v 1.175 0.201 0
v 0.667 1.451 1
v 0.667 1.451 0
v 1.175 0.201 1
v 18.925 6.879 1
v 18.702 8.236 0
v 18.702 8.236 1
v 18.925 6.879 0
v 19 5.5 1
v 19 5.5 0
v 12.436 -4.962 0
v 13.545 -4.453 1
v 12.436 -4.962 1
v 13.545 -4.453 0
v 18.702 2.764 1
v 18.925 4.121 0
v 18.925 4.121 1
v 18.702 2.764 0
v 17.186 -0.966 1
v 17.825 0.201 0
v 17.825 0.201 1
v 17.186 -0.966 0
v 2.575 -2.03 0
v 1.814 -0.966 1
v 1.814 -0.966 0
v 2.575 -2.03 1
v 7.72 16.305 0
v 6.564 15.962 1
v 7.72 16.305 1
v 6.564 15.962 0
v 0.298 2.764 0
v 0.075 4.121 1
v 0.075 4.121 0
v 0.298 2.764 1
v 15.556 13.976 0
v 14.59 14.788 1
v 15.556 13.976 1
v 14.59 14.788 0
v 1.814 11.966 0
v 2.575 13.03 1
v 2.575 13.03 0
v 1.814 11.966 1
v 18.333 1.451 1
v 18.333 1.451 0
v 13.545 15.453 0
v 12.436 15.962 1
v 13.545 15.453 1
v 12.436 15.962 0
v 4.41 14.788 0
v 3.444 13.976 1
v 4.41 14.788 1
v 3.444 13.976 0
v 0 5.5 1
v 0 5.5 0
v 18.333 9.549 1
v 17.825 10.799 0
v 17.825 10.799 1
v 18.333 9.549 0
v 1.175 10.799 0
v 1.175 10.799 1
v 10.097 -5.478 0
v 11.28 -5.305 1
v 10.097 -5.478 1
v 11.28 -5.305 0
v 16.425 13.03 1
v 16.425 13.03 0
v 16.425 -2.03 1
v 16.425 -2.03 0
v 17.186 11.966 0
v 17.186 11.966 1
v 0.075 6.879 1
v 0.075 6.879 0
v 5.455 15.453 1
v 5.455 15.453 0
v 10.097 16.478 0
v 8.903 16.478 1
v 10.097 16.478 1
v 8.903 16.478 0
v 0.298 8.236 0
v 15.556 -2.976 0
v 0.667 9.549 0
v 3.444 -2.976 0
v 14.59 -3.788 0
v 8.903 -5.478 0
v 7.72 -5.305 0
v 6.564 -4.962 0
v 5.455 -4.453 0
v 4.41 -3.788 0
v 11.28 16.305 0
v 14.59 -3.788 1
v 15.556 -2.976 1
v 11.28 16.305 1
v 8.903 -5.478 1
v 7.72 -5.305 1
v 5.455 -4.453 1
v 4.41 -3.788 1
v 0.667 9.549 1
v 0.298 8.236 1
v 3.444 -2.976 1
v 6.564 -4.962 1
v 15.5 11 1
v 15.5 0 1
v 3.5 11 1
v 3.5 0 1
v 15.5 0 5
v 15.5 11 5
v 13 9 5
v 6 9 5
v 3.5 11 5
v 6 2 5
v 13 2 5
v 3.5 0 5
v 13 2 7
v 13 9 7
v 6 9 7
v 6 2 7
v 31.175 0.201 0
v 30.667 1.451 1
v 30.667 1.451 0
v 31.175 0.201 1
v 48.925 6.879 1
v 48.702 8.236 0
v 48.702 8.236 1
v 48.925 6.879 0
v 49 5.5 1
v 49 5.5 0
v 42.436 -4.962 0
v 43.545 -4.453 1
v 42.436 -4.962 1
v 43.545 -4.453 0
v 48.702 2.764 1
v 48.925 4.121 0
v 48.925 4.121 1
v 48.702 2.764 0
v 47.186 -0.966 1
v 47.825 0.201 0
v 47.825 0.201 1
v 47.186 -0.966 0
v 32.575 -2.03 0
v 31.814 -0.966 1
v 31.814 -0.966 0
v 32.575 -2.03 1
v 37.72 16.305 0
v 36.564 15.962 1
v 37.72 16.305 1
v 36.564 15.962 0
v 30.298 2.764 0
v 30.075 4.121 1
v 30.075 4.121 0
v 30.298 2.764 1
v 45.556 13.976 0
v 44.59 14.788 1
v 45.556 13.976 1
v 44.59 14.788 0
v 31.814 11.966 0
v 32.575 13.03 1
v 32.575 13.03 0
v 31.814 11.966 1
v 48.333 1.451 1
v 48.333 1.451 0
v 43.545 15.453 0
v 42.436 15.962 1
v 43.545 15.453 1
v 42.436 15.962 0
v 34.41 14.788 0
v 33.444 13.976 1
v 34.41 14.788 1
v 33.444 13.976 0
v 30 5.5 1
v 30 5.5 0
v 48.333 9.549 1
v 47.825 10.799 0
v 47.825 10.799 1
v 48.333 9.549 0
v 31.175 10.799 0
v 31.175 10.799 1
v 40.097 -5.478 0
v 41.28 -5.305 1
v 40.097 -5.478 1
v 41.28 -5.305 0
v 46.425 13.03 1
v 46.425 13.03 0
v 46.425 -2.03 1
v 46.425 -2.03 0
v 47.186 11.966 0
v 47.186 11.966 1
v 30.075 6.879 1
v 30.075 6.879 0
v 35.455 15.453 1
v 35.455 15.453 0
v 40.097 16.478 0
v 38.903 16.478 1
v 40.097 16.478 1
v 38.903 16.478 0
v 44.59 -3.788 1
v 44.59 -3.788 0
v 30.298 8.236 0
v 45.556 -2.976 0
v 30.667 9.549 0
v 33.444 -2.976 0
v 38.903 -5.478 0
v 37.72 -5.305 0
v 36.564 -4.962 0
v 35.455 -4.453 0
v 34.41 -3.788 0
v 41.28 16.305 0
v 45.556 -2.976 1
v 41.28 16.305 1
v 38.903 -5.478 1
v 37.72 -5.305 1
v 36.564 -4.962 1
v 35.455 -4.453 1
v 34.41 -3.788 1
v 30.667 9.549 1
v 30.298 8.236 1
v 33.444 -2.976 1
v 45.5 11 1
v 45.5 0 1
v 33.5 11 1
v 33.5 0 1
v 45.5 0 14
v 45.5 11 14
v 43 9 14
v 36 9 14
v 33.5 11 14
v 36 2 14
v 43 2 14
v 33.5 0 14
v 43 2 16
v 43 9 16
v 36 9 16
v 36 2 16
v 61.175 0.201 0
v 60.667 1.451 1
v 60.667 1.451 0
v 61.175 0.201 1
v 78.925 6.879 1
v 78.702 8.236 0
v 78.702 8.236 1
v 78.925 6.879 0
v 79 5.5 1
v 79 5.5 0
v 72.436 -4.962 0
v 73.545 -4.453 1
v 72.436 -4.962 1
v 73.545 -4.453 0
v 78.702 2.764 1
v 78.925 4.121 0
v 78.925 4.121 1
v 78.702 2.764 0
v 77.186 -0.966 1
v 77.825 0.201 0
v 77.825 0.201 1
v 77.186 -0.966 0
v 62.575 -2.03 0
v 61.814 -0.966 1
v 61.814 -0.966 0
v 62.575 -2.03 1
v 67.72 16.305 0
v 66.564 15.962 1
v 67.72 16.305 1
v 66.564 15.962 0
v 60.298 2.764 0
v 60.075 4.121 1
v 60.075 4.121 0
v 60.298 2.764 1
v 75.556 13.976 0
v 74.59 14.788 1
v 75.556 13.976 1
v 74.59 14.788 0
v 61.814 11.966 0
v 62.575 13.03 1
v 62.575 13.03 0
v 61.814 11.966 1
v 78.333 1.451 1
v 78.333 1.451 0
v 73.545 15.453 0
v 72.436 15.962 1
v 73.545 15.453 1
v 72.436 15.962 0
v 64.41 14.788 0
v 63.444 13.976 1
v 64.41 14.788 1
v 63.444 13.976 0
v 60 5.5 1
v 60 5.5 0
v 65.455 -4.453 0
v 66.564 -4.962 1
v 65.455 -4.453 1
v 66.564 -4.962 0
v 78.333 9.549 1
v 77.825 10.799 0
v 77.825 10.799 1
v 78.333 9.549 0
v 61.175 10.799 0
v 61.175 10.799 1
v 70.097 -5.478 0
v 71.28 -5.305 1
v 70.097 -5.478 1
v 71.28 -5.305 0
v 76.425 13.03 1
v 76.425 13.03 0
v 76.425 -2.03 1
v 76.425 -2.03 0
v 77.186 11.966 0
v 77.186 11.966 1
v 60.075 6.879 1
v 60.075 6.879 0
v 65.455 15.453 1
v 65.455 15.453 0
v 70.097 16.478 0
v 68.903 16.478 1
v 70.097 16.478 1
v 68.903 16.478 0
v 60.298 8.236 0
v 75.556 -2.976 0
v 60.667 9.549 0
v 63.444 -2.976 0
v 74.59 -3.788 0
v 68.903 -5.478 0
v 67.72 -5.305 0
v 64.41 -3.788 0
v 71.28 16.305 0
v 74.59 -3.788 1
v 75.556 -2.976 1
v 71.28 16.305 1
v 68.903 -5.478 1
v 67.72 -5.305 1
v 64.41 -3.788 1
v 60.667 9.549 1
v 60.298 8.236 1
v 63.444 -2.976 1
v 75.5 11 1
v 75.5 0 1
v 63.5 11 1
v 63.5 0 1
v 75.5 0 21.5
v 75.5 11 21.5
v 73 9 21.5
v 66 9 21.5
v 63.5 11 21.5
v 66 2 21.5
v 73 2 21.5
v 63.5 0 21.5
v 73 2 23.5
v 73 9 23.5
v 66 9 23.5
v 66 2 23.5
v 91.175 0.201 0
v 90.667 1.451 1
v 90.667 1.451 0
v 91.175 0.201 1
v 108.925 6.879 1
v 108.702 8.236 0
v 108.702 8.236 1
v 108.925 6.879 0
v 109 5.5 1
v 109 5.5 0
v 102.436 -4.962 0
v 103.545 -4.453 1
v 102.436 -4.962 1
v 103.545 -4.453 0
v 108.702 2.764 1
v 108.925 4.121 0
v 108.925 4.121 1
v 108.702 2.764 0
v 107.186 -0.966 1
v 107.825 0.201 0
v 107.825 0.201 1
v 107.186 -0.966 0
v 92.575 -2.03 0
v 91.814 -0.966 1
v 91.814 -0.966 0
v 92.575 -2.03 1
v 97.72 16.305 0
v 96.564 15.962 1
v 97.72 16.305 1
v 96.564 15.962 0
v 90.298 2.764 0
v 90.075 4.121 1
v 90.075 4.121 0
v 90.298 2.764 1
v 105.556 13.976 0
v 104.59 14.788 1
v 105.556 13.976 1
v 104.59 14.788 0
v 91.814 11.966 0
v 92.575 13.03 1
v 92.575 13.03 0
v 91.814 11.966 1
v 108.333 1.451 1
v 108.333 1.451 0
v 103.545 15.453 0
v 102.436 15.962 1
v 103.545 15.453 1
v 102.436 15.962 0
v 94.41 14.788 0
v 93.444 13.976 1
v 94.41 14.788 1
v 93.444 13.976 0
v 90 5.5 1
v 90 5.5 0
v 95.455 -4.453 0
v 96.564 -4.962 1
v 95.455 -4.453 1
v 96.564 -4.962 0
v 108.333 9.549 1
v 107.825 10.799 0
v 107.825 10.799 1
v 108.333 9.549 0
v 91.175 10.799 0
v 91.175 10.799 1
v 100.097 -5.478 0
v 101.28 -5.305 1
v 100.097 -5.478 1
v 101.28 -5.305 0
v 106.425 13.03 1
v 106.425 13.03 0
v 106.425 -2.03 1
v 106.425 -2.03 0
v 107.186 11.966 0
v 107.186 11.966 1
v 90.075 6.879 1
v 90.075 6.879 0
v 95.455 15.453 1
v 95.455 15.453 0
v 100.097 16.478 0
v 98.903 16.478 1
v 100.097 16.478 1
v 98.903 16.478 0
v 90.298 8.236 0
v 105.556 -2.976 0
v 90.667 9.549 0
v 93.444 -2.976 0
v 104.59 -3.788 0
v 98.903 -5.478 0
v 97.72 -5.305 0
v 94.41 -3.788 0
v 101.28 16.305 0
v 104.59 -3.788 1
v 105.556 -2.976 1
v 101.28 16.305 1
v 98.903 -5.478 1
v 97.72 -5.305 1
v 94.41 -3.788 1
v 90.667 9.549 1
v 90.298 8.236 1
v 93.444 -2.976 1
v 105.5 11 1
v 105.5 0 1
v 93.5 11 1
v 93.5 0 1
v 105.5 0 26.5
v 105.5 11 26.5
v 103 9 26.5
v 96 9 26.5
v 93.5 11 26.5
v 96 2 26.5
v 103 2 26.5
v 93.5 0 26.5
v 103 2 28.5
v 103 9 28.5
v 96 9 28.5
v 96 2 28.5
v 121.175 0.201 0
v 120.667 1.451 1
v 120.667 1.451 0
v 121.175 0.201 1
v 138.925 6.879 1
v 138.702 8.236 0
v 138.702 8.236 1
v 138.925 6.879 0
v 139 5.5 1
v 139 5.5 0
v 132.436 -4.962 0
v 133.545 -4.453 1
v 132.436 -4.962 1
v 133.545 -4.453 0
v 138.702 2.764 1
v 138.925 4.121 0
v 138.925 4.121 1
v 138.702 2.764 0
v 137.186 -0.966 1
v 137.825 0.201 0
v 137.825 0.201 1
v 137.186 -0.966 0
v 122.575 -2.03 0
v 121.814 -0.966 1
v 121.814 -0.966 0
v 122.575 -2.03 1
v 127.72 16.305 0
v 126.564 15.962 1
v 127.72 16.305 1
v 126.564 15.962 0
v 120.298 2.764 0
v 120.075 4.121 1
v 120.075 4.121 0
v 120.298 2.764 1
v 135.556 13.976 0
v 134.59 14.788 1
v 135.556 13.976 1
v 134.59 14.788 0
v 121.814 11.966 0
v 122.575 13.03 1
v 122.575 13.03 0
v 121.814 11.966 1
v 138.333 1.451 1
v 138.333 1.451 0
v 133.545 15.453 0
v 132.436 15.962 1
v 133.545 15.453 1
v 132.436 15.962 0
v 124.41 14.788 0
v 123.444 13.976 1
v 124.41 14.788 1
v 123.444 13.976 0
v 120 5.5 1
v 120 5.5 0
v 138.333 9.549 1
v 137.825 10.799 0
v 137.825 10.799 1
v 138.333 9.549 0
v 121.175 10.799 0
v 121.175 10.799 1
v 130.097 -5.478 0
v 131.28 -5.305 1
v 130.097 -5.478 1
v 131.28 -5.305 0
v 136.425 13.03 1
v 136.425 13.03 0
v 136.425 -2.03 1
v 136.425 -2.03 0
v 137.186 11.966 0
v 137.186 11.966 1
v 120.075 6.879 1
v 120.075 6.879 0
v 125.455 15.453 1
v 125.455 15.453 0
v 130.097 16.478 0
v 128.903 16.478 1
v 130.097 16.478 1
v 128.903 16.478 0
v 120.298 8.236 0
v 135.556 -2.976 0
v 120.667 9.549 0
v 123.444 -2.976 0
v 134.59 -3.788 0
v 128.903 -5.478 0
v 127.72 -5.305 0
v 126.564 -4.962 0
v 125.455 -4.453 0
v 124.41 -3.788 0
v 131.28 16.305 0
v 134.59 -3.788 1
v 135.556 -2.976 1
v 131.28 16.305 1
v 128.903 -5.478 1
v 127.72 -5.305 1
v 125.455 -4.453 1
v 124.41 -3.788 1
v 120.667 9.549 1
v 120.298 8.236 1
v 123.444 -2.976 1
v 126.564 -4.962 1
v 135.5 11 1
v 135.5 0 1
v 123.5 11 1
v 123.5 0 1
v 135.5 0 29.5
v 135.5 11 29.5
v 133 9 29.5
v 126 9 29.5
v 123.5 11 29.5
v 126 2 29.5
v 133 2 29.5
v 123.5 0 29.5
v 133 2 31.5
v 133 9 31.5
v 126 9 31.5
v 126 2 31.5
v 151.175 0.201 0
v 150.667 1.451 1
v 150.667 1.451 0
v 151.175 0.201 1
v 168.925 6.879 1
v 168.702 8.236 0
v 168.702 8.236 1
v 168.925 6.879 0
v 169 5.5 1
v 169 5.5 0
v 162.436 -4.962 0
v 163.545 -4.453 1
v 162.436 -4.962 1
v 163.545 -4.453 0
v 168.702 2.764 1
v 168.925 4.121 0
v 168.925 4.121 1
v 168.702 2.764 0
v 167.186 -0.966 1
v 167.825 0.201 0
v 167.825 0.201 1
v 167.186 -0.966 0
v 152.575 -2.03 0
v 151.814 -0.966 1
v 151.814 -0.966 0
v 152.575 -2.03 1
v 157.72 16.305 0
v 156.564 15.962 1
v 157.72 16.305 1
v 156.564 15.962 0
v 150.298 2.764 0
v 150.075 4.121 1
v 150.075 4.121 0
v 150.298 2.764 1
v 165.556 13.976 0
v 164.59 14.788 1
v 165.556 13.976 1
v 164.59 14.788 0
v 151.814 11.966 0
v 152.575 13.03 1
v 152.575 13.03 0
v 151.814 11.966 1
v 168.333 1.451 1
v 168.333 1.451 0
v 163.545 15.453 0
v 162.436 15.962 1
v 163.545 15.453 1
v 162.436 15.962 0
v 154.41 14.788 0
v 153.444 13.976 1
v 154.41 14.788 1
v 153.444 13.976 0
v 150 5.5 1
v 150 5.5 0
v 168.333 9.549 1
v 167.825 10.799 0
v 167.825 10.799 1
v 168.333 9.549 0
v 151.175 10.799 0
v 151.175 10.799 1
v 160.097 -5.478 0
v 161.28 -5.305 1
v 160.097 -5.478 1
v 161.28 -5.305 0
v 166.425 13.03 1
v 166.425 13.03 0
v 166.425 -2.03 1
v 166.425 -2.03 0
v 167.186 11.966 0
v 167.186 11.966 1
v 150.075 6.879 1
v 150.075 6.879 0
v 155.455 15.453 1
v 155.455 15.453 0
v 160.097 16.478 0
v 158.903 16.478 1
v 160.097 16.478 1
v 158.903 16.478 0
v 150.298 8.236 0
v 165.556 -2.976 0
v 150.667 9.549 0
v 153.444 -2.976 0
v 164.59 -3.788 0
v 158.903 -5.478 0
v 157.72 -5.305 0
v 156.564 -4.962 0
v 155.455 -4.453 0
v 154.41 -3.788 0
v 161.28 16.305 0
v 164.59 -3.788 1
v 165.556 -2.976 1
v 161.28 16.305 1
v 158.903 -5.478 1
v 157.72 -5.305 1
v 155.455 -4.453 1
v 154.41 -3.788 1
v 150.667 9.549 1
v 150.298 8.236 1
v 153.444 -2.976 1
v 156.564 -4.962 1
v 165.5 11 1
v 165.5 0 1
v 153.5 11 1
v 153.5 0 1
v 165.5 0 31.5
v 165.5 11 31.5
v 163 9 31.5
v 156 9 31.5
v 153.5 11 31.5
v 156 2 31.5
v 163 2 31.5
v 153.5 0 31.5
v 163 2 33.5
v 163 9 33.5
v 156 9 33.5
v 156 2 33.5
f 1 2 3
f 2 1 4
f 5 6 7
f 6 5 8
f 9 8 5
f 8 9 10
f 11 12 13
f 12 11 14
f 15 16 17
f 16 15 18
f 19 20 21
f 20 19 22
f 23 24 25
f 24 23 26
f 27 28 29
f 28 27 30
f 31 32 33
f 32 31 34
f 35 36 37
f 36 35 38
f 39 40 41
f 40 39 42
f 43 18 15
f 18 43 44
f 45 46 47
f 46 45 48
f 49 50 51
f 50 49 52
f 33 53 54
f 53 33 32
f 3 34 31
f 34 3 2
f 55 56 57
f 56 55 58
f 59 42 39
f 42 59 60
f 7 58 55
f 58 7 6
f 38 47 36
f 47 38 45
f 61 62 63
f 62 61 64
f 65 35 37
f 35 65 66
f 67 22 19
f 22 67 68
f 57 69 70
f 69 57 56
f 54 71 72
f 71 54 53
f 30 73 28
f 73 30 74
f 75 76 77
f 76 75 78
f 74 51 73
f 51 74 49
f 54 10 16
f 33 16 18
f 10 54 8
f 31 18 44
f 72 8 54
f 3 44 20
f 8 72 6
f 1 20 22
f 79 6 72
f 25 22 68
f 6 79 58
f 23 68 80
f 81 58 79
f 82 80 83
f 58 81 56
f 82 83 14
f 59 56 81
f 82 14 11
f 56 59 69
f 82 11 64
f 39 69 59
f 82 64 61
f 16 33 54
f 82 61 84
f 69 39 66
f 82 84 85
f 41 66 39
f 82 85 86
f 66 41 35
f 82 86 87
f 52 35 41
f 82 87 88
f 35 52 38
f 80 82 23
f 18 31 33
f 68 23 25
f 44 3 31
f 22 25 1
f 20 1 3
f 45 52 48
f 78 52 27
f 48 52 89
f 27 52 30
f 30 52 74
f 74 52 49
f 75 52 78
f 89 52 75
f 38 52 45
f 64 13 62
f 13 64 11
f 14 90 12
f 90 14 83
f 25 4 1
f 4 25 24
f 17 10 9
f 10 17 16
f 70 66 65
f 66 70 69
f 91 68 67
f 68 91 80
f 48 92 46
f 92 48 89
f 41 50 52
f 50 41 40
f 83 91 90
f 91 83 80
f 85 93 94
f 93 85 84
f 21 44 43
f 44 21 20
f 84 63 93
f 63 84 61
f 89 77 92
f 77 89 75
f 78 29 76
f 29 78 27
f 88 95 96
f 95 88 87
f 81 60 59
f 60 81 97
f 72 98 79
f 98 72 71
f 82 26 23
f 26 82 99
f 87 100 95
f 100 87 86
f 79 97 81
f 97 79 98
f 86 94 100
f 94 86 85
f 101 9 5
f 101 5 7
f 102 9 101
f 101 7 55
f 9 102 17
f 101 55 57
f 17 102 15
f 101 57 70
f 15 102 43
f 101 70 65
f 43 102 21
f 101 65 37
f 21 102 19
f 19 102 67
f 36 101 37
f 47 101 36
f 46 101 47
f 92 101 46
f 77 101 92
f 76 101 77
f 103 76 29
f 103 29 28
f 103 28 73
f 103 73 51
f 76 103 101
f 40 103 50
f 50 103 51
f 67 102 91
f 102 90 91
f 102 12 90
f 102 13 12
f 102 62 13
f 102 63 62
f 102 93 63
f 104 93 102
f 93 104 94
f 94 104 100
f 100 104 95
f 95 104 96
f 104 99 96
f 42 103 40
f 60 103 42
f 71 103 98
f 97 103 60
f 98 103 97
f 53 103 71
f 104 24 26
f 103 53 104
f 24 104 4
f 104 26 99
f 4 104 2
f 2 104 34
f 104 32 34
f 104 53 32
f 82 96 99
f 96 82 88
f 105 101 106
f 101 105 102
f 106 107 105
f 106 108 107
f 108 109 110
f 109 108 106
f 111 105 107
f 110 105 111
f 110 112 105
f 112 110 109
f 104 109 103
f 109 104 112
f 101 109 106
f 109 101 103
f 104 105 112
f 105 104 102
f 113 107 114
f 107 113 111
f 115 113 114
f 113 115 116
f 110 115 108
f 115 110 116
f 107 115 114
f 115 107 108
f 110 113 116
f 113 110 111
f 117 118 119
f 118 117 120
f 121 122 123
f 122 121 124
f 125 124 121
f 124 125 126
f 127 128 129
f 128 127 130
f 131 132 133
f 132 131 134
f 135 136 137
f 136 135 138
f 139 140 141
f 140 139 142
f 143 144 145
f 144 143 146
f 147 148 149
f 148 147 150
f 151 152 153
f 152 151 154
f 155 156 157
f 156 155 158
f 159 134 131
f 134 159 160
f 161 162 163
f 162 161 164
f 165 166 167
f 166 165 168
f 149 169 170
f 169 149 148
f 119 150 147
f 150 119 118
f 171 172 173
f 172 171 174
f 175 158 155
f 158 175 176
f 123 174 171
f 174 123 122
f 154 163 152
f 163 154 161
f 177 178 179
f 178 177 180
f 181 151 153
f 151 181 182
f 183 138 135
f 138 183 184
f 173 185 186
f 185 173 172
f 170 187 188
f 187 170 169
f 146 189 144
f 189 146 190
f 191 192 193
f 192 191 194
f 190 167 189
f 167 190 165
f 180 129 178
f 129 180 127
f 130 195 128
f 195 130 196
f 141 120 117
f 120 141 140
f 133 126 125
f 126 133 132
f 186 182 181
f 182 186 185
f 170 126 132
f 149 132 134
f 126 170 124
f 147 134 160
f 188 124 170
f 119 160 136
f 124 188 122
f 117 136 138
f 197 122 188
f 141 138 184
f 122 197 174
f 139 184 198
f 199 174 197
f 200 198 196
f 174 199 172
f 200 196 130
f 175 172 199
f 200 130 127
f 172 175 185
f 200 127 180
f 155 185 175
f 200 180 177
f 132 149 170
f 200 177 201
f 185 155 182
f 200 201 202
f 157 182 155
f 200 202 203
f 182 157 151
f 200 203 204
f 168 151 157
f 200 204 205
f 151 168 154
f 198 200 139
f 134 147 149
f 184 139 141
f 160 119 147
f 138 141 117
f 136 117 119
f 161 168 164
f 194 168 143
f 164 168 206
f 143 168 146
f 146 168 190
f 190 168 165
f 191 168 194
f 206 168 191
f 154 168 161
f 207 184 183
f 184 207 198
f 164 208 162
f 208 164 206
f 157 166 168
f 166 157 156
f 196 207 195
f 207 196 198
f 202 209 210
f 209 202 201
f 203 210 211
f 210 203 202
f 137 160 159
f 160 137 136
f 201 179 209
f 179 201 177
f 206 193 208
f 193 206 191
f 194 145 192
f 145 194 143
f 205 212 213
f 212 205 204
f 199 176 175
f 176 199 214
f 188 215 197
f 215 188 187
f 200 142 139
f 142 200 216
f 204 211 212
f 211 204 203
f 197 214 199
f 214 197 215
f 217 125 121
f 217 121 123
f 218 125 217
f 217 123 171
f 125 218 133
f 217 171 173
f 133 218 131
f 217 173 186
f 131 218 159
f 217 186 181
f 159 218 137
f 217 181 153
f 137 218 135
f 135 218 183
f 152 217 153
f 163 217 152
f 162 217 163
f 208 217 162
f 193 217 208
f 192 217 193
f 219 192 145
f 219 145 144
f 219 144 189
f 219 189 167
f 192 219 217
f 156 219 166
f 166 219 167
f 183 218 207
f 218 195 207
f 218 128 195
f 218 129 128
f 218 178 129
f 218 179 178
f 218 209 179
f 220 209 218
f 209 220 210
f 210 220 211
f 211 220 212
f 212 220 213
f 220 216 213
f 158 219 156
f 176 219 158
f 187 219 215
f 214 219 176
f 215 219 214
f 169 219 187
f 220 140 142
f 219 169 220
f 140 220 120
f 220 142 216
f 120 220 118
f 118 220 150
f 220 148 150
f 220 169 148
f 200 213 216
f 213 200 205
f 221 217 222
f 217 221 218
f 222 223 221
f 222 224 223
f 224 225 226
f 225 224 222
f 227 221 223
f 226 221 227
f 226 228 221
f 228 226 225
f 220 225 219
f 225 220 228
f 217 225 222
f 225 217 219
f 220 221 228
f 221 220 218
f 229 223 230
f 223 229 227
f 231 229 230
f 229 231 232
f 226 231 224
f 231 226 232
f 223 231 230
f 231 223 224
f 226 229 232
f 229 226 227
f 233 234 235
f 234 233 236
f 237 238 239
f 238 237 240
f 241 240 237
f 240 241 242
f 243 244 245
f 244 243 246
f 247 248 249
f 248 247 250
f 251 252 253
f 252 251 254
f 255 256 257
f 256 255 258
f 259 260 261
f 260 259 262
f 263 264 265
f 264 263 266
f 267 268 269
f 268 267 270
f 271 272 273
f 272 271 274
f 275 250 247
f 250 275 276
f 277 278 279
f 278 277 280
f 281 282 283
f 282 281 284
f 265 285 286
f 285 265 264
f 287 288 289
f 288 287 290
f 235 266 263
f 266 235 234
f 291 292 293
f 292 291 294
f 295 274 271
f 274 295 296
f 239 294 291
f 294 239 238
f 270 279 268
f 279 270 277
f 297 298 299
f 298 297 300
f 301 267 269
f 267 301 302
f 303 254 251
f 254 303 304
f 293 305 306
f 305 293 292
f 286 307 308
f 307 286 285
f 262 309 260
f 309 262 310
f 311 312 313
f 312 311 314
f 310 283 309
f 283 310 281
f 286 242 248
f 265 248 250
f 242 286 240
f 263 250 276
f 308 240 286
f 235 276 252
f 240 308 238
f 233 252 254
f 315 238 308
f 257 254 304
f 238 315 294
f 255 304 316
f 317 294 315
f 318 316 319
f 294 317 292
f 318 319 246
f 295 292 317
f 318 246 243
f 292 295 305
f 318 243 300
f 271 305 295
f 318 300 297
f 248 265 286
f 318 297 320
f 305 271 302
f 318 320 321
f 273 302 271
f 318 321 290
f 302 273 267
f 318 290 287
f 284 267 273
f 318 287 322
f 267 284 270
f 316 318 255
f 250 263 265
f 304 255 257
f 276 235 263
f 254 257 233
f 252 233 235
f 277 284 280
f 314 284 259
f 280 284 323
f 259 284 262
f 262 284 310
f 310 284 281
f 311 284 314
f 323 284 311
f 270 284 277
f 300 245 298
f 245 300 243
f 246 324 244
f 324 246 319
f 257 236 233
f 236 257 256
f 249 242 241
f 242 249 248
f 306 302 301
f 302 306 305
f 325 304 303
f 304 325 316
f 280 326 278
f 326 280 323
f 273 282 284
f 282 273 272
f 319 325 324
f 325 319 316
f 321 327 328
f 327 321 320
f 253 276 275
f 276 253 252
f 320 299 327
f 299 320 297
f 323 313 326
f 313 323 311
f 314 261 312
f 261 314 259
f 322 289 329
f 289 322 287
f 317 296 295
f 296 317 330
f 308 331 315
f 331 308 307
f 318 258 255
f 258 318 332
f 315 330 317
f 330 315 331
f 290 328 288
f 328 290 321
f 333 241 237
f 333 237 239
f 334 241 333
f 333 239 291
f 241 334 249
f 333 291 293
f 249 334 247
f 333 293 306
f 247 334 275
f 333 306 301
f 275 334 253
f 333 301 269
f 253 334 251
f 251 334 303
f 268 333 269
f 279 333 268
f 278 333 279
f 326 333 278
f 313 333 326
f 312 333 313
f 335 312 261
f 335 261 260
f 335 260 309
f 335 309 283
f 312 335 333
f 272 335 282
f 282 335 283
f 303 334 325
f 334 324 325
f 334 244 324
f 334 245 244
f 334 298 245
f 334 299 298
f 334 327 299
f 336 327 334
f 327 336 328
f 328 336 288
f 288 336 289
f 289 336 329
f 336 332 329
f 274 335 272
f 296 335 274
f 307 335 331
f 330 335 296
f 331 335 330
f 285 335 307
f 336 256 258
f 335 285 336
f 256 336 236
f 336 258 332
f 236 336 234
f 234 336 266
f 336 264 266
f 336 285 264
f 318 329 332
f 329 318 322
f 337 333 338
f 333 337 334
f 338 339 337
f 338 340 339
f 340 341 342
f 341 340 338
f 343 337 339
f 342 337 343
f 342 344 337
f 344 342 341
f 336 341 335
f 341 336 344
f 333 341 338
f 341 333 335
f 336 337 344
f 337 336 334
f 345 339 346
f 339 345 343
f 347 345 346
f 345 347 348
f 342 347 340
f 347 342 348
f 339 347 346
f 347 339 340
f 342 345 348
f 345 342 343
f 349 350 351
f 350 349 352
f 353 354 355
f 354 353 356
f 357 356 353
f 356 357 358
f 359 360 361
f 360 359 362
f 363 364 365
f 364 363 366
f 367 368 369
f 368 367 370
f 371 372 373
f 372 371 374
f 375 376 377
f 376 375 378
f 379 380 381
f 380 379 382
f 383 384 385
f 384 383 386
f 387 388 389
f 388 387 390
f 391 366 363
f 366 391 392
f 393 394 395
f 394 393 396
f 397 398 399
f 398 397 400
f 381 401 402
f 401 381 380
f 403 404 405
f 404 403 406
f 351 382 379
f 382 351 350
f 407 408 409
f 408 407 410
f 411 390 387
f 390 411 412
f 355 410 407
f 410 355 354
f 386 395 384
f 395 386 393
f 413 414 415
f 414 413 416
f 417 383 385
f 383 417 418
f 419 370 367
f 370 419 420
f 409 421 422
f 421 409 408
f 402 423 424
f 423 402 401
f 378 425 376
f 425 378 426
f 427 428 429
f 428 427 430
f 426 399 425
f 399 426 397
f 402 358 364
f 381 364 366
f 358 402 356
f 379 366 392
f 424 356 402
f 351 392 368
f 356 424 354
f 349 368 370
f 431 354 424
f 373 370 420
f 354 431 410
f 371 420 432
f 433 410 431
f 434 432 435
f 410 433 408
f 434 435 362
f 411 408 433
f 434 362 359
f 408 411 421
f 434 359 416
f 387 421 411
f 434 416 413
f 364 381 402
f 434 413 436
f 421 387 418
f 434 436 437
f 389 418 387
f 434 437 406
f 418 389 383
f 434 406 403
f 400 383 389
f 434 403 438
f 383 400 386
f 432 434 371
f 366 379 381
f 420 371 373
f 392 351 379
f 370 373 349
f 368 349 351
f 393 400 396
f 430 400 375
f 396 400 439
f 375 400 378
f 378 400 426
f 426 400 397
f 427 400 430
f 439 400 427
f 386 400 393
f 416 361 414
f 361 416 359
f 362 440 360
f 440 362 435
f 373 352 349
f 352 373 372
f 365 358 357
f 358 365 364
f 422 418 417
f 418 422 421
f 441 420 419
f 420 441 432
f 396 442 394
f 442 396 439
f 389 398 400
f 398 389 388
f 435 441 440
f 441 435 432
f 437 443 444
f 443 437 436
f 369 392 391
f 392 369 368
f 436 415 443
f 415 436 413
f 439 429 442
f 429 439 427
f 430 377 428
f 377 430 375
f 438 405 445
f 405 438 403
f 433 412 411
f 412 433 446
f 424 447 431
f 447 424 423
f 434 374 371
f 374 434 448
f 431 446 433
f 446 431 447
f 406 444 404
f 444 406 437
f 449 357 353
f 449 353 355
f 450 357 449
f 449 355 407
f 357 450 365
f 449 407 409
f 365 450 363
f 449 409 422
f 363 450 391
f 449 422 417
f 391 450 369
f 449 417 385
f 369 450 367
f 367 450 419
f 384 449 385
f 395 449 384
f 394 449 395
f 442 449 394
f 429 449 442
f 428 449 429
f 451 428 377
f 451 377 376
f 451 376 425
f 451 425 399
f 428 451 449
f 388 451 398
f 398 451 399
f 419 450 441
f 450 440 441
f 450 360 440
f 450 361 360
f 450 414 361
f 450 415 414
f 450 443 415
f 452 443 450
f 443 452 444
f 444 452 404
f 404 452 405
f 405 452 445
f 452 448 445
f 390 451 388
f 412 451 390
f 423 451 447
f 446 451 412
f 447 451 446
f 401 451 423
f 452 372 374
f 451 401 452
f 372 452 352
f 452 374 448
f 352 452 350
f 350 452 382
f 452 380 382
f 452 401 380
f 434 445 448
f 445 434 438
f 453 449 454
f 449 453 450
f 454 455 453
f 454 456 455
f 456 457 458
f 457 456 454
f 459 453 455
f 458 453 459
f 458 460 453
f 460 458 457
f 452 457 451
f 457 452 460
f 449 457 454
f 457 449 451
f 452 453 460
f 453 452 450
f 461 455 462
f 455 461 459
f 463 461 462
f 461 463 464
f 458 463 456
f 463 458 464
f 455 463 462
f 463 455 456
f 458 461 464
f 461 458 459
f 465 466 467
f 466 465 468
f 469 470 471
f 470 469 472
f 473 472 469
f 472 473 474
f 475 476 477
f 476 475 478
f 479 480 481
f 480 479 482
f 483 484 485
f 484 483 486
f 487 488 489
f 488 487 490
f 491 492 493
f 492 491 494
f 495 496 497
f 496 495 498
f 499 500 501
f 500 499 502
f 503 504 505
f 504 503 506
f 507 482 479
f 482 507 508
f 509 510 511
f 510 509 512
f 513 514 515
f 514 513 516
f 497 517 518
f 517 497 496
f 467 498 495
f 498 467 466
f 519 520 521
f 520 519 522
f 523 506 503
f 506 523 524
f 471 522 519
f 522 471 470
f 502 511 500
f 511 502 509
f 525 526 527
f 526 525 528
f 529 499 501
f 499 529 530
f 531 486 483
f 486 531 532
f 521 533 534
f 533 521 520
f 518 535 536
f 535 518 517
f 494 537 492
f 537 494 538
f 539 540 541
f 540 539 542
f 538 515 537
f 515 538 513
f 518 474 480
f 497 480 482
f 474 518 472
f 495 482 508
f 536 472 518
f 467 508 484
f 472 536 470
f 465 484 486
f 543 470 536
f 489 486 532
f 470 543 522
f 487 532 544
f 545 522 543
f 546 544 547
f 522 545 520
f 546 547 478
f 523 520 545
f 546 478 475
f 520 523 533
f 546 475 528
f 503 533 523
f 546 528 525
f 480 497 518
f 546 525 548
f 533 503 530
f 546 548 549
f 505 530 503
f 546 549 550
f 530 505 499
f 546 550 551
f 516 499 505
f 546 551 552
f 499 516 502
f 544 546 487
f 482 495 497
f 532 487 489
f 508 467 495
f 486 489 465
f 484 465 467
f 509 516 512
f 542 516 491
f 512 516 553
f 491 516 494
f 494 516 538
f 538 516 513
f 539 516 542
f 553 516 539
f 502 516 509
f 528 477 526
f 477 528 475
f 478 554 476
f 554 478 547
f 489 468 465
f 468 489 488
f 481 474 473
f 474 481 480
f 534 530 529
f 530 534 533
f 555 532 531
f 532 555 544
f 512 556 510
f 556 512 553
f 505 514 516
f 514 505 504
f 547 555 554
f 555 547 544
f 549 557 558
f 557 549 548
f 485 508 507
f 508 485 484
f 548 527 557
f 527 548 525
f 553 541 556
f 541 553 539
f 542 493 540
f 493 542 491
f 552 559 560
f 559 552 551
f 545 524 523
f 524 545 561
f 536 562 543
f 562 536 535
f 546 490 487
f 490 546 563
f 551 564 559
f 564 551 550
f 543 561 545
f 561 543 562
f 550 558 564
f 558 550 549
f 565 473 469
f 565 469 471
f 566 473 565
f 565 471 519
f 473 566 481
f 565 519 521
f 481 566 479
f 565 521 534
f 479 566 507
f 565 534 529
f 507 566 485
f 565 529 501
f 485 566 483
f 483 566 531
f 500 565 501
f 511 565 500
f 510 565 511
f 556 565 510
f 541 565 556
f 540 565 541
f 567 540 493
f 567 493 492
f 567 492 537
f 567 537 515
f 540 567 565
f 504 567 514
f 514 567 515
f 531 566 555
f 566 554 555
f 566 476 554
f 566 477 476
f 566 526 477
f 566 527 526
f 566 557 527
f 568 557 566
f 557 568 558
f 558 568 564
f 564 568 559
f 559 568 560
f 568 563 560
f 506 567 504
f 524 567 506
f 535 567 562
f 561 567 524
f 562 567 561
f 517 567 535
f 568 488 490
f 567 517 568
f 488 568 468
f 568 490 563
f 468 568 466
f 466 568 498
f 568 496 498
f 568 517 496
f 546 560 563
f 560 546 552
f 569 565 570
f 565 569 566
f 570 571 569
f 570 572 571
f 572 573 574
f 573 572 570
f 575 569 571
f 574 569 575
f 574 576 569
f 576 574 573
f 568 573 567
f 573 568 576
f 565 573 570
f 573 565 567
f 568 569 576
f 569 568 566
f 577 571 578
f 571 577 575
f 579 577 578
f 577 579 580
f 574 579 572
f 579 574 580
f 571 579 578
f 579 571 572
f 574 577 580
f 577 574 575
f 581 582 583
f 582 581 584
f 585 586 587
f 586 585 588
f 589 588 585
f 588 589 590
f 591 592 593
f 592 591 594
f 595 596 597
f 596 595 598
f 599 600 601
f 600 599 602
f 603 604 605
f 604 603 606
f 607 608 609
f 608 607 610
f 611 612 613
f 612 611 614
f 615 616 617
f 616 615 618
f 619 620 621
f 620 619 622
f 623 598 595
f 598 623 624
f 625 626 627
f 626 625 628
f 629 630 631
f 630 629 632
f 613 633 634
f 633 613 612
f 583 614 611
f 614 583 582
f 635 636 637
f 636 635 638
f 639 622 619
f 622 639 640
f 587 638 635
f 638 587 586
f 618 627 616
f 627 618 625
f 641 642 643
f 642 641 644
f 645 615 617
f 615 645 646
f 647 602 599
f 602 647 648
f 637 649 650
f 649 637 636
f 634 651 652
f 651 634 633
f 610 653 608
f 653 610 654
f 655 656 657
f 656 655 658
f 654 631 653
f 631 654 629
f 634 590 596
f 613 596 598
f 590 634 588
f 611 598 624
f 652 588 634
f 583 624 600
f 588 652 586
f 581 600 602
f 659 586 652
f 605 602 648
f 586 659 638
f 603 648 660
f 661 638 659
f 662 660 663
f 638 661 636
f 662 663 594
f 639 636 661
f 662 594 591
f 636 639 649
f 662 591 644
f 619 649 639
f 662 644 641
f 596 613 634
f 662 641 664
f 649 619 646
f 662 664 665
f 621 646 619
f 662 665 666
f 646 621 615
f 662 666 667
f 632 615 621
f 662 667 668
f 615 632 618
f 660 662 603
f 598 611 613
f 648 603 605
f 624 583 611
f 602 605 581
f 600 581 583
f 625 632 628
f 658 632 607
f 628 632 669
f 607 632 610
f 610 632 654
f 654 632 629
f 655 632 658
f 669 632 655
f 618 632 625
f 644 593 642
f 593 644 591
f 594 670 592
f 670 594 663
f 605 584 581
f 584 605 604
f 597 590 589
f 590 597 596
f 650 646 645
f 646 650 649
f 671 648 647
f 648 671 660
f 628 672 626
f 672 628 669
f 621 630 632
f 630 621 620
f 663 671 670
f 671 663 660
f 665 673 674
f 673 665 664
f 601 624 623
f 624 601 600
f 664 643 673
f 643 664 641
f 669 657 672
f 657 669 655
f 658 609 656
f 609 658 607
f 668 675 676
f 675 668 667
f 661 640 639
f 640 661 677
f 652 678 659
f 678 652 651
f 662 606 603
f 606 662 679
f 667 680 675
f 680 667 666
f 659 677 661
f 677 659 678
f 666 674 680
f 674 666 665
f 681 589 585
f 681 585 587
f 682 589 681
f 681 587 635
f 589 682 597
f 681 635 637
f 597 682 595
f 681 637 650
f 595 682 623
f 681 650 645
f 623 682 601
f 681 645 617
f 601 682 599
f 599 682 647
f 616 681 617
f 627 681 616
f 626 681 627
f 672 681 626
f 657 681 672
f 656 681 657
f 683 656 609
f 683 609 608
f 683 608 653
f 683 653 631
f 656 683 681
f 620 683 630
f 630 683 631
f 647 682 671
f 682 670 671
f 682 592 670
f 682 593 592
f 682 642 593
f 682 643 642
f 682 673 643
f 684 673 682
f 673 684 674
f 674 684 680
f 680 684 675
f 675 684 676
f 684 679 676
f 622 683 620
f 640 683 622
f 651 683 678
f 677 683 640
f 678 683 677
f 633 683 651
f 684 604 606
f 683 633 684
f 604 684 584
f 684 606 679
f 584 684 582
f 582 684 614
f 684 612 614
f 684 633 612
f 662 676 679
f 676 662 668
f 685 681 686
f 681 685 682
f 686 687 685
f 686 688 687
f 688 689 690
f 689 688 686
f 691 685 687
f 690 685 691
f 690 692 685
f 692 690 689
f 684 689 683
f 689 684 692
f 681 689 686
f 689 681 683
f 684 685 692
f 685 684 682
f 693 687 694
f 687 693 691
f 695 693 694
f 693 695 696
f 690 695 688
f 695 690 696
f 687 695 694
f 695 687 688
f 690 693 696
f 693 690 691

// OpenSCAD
include <key-base.scad>;
translate([30*0,0,0])padPeg(0);
translate([30*1,0,0])padPeg(1);
translate([30*2,0,0])padPeg(2);
translate([30*3,0,0])padPeg(3);
translate([30*4,0,0])padPeg(4);
translate([30*5,0,0])padPeg(5);
